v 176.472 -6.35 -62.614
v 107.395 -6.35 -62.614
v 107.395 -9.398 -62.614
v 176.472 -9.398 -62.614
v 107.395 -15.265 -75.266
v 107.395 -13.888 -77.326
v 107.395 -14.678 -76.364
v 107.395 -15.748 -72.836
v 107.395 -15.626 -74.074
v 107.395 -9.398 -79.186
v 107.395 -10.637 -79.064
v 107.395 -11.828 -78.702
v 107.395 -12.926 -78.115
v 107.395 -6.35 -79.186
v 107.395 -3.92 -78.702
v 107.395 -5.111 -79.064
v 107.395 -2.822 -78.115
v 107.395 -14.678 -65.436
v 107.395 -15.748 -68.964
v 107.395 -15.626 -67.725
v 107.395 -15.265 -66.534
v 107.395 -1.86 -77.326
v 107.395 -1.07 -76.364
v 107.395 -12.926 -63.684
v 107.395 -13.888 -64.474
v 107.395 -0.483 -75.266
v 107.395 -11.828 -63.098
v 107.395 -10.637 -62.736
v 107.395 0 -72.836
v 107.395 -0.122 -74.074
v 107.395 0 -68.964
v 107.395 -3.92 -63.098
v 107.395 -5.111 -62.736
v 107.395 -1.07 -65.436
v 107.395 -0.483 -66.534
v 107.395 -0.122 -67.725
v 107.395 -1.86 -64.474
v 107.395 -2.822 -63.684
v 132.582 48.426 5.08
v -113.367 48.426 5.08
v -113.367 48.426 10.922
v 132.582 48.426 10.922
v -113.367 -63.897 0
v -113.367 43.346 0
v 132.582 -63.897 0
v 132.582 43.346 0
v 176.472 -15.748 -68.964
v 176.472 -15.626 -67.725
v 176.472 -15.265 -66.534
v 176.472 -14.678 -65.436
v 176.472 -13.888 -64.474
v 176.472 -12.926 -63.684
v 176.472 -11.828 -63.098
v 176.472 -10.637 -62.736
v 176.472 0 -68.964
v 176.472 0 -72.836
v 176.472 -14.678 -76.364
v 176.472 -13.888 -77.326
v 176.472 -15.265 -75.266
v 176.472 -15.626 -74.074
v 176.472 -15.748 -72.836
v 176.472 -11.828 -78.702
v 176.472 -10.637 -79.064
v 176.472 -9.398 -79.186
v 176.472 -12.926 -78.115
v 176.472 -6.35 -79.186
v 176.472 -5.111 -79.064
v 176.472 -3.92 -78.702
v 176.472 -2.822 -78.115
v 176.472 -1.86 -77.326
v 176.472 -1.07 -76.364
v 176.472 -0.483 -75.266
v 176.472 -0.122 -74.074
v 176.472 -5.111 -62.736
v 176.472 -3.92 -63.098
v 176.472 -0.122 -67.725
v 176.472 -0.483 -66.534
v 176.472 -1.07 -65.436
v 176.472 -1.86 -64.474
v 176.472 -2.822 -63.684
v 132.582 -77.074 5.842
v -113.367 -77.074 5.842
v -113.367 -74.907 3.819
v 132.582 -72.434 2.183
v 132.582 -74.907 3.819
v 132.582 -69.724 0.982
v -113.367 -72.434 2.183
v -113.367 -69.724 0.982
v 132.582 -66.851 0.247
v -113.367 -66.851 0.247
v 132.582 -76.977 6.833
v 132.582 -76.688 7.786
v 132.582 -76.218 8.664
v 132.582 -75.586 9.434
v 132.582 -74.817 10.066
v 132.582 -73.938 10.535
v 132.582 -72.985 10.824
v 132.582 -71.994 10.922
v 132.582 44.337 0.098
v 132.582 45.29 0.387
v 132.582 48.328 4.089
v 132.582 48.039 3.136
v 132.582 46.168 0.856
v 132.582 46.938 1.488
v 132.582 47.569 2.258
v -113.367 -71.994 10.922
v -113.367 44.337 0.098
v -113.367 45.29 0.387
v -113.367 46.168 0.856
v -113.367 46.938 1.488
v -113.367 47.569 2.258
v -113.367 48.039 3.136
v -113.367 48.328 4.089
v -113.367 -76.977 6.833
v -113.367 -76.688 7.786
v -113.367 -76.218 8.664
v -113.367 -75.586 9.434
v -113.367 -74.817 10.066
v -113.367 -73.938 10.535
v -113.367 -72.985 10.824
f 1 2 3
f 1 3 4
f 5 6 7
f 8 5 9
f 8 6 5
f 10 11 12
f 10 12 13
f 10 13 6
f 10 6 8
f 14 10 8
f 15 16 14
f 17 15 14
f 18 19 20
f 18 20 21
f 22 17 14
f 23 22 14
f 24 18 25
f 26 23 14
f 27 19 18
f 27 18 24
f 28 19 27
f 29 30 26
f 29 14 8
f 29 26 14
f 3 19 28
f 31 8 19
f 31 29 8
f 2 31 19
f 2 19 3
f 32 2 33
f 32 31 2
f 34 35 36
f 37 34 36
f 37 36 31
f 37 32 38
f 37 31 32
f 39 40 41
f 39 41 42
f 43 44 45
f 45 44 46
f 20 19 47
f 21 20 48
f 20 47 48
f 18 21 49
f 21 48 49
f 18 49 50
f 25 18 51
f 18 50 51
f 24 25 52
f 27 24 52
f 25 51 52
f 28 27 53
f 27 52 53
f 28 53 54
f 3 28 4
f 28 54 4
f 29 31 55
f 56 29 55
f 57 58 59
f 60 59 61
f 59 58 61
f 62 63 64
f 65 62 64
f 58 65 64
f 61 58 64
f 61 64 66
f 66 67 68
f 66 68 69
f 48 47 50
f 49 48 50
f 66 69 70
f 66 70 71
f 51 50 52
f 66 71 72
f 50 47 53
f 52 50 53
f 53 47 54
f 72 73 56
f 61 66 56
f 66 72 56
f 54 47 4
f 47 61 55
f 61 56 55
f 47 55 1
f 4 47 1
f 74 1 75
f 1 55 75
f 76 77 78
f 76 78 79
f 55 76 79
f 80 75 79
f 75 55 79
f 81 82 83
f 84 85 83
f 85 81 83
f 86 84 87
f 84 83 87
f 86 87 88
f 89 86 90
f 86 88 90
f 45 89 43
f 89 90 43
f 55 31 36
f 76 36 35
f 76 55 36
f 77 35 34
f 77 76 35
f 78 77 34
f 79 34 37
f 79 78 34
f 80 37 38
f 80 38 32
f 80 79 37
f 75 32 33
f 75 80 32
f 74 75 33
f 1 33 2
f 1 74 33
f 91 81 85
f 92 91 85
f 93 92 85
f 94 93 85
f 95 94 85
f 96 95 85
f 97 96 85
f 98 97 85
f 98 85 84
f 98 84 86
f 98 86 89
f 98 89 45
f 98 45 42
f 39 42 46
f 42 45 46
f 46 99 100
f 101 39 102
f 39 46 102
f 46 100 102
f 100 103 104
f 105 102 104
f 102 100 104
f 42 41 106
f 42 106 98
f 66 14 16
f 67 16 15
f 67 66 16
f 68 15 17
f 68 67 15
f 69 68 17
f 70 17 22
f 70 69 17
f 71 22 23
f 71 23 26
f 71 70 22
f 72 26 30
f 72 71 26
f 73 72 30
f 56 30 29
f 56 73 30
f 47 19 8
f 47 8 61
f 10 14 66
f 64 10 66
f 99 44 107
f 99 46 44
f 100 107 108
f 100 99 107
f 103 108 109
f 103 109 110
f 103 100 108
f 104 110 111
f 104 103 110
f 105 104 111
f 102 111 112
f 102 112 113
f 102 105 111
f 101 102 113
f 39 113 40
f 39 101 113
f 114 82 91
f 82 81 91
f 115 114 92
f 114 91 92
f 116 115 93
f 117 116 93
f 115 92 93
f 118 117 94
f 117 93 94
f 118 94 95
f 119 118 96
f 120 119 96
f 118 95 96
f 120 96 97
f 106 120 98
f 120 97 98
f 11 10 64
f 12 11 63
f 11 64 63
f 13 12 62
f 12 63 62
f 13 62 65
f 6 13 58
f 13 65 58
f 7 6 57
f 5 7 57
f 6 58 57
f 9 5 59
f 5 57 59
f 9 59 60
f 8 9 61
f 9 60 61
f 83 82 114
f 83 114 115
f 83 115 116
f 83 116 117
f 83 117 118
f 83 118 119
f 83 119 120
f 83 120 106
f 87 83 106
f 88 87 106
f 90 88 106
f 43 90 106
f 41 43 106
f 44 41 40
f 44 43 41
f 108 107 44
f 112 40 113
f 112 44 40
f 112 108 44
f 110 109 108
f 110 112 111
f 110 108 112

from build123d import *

# Parameters (mm, degrees)
F0_W        = 245.9494993091
F0_H        = 125.4998669028
F1_DEPTH    = 10.922
F2_R        = 5.08
F3_T1_DEPTH = 311.8374235671
F4_R        = 5.08
F5_W        = 69.0777301788
F5_H        = 16.571380198
F6_DEPTH    = 15.748
F7_R        = 6.35
F8_R        = 6.35
F9_R        = 6.35
F10_R       = 6.35


# Not quite as in the source:
# - a fillet or chamfer that OpenCascade refuses, or shapes differently, is made with other operations: its cross-section is extruded or revolved along the edge and cut away or added


with BuildPart() as f1:
    # F0 (on Top) → F1 (new body)
    with BuildSketch(Plane.XY):
        with Locations((9.6076615155, -14.3243558705)):
            Rectangle(F0_W, F0_H)
    extrude(amount=F1_DEPTH)

    # F2
    f2_edges = [f1.edges().sort_by_distance(p)[0] for p in [
        (9.607662, -77.074289, 10.922),
    ]]
    fillet(f2_edges, radius=F2_R)

    # F3: fillet of radius 17.7830971004 on 1 edges, made by hand

    # F3_s2 → F3_t1 (cut)
    with BuildSketch(Plane.YZ.offset(-146.3110502681)):
        with BuildLine():
            ThreePointArc((-77.0742893219, 5.842), (-71.1039526713, 1.5259720209), (-63.8967044703, 0))
            Line((-63.8967044703, 0), (-63.8967044703, -0.355661942))
            Line((-63.8967044703, -0.355661942), (-77.0742893219, -0.355661942))
            Line((-77.0742893219, -0.355661942), (-77.4299512639, 0))
            ThreePointArc((-77.4299512639, 0), (-77.4299512639, 2.921), (-77.3378410189, 5.603178058))
            Line((-77.3378410189, 5.603178058), (-77.0742893219, 5.842))
        make_face()
    extrude(amount=F3_T1_DEPTH, mode=Mode.SUBTRACT)

    # F4
    f4_edges = [f1.edges().sort_by_distance(p)[0] for p in [
        (9.607662, 48.425578, 0),
    ]]
    fillet(f4_edges, radius=F4_R)


with BuildPart() as f6:
    # F5 (on Front) → F6 (new body)
    with BuildSketch(Plane.XZ):
        with Locations((141.9334262609, -70.8999745548)):
            Rectangle(F5_W, F5_H)
    extrude(amount=F6_DEPTH)

    # F7
    f7_edges = [f6.edges().sort_by_distance(p)[0] for p in [
        (141.933426, 0, -79.185665),
    ]]
    fillet(f7_edges, radius=F7_R)

    # F8
    f8_edges = [f6.edges().sort_by_distance(p)[0] for p in [
        (141.933426, 0, -62.614284),
    ]]
    fillet(f8_edges, radius=F8_R)

    # F9
    f9_edges = [f6.edges().sort_by_distance(p)[0] for p in [
        (141.933426, -15.748, -79.185665),
    ]]
    fillet(f9_edges, radius=F9_R)

    # F10
    f10_edges = [f6.edges().sort_by_distance(p)[0] for p in [
        (141.933426, -15.748, -62.614284),
    ]]
    fillet(f10_edges, radius=F10_R)


solid = Compound([f1.part, f6.part])
